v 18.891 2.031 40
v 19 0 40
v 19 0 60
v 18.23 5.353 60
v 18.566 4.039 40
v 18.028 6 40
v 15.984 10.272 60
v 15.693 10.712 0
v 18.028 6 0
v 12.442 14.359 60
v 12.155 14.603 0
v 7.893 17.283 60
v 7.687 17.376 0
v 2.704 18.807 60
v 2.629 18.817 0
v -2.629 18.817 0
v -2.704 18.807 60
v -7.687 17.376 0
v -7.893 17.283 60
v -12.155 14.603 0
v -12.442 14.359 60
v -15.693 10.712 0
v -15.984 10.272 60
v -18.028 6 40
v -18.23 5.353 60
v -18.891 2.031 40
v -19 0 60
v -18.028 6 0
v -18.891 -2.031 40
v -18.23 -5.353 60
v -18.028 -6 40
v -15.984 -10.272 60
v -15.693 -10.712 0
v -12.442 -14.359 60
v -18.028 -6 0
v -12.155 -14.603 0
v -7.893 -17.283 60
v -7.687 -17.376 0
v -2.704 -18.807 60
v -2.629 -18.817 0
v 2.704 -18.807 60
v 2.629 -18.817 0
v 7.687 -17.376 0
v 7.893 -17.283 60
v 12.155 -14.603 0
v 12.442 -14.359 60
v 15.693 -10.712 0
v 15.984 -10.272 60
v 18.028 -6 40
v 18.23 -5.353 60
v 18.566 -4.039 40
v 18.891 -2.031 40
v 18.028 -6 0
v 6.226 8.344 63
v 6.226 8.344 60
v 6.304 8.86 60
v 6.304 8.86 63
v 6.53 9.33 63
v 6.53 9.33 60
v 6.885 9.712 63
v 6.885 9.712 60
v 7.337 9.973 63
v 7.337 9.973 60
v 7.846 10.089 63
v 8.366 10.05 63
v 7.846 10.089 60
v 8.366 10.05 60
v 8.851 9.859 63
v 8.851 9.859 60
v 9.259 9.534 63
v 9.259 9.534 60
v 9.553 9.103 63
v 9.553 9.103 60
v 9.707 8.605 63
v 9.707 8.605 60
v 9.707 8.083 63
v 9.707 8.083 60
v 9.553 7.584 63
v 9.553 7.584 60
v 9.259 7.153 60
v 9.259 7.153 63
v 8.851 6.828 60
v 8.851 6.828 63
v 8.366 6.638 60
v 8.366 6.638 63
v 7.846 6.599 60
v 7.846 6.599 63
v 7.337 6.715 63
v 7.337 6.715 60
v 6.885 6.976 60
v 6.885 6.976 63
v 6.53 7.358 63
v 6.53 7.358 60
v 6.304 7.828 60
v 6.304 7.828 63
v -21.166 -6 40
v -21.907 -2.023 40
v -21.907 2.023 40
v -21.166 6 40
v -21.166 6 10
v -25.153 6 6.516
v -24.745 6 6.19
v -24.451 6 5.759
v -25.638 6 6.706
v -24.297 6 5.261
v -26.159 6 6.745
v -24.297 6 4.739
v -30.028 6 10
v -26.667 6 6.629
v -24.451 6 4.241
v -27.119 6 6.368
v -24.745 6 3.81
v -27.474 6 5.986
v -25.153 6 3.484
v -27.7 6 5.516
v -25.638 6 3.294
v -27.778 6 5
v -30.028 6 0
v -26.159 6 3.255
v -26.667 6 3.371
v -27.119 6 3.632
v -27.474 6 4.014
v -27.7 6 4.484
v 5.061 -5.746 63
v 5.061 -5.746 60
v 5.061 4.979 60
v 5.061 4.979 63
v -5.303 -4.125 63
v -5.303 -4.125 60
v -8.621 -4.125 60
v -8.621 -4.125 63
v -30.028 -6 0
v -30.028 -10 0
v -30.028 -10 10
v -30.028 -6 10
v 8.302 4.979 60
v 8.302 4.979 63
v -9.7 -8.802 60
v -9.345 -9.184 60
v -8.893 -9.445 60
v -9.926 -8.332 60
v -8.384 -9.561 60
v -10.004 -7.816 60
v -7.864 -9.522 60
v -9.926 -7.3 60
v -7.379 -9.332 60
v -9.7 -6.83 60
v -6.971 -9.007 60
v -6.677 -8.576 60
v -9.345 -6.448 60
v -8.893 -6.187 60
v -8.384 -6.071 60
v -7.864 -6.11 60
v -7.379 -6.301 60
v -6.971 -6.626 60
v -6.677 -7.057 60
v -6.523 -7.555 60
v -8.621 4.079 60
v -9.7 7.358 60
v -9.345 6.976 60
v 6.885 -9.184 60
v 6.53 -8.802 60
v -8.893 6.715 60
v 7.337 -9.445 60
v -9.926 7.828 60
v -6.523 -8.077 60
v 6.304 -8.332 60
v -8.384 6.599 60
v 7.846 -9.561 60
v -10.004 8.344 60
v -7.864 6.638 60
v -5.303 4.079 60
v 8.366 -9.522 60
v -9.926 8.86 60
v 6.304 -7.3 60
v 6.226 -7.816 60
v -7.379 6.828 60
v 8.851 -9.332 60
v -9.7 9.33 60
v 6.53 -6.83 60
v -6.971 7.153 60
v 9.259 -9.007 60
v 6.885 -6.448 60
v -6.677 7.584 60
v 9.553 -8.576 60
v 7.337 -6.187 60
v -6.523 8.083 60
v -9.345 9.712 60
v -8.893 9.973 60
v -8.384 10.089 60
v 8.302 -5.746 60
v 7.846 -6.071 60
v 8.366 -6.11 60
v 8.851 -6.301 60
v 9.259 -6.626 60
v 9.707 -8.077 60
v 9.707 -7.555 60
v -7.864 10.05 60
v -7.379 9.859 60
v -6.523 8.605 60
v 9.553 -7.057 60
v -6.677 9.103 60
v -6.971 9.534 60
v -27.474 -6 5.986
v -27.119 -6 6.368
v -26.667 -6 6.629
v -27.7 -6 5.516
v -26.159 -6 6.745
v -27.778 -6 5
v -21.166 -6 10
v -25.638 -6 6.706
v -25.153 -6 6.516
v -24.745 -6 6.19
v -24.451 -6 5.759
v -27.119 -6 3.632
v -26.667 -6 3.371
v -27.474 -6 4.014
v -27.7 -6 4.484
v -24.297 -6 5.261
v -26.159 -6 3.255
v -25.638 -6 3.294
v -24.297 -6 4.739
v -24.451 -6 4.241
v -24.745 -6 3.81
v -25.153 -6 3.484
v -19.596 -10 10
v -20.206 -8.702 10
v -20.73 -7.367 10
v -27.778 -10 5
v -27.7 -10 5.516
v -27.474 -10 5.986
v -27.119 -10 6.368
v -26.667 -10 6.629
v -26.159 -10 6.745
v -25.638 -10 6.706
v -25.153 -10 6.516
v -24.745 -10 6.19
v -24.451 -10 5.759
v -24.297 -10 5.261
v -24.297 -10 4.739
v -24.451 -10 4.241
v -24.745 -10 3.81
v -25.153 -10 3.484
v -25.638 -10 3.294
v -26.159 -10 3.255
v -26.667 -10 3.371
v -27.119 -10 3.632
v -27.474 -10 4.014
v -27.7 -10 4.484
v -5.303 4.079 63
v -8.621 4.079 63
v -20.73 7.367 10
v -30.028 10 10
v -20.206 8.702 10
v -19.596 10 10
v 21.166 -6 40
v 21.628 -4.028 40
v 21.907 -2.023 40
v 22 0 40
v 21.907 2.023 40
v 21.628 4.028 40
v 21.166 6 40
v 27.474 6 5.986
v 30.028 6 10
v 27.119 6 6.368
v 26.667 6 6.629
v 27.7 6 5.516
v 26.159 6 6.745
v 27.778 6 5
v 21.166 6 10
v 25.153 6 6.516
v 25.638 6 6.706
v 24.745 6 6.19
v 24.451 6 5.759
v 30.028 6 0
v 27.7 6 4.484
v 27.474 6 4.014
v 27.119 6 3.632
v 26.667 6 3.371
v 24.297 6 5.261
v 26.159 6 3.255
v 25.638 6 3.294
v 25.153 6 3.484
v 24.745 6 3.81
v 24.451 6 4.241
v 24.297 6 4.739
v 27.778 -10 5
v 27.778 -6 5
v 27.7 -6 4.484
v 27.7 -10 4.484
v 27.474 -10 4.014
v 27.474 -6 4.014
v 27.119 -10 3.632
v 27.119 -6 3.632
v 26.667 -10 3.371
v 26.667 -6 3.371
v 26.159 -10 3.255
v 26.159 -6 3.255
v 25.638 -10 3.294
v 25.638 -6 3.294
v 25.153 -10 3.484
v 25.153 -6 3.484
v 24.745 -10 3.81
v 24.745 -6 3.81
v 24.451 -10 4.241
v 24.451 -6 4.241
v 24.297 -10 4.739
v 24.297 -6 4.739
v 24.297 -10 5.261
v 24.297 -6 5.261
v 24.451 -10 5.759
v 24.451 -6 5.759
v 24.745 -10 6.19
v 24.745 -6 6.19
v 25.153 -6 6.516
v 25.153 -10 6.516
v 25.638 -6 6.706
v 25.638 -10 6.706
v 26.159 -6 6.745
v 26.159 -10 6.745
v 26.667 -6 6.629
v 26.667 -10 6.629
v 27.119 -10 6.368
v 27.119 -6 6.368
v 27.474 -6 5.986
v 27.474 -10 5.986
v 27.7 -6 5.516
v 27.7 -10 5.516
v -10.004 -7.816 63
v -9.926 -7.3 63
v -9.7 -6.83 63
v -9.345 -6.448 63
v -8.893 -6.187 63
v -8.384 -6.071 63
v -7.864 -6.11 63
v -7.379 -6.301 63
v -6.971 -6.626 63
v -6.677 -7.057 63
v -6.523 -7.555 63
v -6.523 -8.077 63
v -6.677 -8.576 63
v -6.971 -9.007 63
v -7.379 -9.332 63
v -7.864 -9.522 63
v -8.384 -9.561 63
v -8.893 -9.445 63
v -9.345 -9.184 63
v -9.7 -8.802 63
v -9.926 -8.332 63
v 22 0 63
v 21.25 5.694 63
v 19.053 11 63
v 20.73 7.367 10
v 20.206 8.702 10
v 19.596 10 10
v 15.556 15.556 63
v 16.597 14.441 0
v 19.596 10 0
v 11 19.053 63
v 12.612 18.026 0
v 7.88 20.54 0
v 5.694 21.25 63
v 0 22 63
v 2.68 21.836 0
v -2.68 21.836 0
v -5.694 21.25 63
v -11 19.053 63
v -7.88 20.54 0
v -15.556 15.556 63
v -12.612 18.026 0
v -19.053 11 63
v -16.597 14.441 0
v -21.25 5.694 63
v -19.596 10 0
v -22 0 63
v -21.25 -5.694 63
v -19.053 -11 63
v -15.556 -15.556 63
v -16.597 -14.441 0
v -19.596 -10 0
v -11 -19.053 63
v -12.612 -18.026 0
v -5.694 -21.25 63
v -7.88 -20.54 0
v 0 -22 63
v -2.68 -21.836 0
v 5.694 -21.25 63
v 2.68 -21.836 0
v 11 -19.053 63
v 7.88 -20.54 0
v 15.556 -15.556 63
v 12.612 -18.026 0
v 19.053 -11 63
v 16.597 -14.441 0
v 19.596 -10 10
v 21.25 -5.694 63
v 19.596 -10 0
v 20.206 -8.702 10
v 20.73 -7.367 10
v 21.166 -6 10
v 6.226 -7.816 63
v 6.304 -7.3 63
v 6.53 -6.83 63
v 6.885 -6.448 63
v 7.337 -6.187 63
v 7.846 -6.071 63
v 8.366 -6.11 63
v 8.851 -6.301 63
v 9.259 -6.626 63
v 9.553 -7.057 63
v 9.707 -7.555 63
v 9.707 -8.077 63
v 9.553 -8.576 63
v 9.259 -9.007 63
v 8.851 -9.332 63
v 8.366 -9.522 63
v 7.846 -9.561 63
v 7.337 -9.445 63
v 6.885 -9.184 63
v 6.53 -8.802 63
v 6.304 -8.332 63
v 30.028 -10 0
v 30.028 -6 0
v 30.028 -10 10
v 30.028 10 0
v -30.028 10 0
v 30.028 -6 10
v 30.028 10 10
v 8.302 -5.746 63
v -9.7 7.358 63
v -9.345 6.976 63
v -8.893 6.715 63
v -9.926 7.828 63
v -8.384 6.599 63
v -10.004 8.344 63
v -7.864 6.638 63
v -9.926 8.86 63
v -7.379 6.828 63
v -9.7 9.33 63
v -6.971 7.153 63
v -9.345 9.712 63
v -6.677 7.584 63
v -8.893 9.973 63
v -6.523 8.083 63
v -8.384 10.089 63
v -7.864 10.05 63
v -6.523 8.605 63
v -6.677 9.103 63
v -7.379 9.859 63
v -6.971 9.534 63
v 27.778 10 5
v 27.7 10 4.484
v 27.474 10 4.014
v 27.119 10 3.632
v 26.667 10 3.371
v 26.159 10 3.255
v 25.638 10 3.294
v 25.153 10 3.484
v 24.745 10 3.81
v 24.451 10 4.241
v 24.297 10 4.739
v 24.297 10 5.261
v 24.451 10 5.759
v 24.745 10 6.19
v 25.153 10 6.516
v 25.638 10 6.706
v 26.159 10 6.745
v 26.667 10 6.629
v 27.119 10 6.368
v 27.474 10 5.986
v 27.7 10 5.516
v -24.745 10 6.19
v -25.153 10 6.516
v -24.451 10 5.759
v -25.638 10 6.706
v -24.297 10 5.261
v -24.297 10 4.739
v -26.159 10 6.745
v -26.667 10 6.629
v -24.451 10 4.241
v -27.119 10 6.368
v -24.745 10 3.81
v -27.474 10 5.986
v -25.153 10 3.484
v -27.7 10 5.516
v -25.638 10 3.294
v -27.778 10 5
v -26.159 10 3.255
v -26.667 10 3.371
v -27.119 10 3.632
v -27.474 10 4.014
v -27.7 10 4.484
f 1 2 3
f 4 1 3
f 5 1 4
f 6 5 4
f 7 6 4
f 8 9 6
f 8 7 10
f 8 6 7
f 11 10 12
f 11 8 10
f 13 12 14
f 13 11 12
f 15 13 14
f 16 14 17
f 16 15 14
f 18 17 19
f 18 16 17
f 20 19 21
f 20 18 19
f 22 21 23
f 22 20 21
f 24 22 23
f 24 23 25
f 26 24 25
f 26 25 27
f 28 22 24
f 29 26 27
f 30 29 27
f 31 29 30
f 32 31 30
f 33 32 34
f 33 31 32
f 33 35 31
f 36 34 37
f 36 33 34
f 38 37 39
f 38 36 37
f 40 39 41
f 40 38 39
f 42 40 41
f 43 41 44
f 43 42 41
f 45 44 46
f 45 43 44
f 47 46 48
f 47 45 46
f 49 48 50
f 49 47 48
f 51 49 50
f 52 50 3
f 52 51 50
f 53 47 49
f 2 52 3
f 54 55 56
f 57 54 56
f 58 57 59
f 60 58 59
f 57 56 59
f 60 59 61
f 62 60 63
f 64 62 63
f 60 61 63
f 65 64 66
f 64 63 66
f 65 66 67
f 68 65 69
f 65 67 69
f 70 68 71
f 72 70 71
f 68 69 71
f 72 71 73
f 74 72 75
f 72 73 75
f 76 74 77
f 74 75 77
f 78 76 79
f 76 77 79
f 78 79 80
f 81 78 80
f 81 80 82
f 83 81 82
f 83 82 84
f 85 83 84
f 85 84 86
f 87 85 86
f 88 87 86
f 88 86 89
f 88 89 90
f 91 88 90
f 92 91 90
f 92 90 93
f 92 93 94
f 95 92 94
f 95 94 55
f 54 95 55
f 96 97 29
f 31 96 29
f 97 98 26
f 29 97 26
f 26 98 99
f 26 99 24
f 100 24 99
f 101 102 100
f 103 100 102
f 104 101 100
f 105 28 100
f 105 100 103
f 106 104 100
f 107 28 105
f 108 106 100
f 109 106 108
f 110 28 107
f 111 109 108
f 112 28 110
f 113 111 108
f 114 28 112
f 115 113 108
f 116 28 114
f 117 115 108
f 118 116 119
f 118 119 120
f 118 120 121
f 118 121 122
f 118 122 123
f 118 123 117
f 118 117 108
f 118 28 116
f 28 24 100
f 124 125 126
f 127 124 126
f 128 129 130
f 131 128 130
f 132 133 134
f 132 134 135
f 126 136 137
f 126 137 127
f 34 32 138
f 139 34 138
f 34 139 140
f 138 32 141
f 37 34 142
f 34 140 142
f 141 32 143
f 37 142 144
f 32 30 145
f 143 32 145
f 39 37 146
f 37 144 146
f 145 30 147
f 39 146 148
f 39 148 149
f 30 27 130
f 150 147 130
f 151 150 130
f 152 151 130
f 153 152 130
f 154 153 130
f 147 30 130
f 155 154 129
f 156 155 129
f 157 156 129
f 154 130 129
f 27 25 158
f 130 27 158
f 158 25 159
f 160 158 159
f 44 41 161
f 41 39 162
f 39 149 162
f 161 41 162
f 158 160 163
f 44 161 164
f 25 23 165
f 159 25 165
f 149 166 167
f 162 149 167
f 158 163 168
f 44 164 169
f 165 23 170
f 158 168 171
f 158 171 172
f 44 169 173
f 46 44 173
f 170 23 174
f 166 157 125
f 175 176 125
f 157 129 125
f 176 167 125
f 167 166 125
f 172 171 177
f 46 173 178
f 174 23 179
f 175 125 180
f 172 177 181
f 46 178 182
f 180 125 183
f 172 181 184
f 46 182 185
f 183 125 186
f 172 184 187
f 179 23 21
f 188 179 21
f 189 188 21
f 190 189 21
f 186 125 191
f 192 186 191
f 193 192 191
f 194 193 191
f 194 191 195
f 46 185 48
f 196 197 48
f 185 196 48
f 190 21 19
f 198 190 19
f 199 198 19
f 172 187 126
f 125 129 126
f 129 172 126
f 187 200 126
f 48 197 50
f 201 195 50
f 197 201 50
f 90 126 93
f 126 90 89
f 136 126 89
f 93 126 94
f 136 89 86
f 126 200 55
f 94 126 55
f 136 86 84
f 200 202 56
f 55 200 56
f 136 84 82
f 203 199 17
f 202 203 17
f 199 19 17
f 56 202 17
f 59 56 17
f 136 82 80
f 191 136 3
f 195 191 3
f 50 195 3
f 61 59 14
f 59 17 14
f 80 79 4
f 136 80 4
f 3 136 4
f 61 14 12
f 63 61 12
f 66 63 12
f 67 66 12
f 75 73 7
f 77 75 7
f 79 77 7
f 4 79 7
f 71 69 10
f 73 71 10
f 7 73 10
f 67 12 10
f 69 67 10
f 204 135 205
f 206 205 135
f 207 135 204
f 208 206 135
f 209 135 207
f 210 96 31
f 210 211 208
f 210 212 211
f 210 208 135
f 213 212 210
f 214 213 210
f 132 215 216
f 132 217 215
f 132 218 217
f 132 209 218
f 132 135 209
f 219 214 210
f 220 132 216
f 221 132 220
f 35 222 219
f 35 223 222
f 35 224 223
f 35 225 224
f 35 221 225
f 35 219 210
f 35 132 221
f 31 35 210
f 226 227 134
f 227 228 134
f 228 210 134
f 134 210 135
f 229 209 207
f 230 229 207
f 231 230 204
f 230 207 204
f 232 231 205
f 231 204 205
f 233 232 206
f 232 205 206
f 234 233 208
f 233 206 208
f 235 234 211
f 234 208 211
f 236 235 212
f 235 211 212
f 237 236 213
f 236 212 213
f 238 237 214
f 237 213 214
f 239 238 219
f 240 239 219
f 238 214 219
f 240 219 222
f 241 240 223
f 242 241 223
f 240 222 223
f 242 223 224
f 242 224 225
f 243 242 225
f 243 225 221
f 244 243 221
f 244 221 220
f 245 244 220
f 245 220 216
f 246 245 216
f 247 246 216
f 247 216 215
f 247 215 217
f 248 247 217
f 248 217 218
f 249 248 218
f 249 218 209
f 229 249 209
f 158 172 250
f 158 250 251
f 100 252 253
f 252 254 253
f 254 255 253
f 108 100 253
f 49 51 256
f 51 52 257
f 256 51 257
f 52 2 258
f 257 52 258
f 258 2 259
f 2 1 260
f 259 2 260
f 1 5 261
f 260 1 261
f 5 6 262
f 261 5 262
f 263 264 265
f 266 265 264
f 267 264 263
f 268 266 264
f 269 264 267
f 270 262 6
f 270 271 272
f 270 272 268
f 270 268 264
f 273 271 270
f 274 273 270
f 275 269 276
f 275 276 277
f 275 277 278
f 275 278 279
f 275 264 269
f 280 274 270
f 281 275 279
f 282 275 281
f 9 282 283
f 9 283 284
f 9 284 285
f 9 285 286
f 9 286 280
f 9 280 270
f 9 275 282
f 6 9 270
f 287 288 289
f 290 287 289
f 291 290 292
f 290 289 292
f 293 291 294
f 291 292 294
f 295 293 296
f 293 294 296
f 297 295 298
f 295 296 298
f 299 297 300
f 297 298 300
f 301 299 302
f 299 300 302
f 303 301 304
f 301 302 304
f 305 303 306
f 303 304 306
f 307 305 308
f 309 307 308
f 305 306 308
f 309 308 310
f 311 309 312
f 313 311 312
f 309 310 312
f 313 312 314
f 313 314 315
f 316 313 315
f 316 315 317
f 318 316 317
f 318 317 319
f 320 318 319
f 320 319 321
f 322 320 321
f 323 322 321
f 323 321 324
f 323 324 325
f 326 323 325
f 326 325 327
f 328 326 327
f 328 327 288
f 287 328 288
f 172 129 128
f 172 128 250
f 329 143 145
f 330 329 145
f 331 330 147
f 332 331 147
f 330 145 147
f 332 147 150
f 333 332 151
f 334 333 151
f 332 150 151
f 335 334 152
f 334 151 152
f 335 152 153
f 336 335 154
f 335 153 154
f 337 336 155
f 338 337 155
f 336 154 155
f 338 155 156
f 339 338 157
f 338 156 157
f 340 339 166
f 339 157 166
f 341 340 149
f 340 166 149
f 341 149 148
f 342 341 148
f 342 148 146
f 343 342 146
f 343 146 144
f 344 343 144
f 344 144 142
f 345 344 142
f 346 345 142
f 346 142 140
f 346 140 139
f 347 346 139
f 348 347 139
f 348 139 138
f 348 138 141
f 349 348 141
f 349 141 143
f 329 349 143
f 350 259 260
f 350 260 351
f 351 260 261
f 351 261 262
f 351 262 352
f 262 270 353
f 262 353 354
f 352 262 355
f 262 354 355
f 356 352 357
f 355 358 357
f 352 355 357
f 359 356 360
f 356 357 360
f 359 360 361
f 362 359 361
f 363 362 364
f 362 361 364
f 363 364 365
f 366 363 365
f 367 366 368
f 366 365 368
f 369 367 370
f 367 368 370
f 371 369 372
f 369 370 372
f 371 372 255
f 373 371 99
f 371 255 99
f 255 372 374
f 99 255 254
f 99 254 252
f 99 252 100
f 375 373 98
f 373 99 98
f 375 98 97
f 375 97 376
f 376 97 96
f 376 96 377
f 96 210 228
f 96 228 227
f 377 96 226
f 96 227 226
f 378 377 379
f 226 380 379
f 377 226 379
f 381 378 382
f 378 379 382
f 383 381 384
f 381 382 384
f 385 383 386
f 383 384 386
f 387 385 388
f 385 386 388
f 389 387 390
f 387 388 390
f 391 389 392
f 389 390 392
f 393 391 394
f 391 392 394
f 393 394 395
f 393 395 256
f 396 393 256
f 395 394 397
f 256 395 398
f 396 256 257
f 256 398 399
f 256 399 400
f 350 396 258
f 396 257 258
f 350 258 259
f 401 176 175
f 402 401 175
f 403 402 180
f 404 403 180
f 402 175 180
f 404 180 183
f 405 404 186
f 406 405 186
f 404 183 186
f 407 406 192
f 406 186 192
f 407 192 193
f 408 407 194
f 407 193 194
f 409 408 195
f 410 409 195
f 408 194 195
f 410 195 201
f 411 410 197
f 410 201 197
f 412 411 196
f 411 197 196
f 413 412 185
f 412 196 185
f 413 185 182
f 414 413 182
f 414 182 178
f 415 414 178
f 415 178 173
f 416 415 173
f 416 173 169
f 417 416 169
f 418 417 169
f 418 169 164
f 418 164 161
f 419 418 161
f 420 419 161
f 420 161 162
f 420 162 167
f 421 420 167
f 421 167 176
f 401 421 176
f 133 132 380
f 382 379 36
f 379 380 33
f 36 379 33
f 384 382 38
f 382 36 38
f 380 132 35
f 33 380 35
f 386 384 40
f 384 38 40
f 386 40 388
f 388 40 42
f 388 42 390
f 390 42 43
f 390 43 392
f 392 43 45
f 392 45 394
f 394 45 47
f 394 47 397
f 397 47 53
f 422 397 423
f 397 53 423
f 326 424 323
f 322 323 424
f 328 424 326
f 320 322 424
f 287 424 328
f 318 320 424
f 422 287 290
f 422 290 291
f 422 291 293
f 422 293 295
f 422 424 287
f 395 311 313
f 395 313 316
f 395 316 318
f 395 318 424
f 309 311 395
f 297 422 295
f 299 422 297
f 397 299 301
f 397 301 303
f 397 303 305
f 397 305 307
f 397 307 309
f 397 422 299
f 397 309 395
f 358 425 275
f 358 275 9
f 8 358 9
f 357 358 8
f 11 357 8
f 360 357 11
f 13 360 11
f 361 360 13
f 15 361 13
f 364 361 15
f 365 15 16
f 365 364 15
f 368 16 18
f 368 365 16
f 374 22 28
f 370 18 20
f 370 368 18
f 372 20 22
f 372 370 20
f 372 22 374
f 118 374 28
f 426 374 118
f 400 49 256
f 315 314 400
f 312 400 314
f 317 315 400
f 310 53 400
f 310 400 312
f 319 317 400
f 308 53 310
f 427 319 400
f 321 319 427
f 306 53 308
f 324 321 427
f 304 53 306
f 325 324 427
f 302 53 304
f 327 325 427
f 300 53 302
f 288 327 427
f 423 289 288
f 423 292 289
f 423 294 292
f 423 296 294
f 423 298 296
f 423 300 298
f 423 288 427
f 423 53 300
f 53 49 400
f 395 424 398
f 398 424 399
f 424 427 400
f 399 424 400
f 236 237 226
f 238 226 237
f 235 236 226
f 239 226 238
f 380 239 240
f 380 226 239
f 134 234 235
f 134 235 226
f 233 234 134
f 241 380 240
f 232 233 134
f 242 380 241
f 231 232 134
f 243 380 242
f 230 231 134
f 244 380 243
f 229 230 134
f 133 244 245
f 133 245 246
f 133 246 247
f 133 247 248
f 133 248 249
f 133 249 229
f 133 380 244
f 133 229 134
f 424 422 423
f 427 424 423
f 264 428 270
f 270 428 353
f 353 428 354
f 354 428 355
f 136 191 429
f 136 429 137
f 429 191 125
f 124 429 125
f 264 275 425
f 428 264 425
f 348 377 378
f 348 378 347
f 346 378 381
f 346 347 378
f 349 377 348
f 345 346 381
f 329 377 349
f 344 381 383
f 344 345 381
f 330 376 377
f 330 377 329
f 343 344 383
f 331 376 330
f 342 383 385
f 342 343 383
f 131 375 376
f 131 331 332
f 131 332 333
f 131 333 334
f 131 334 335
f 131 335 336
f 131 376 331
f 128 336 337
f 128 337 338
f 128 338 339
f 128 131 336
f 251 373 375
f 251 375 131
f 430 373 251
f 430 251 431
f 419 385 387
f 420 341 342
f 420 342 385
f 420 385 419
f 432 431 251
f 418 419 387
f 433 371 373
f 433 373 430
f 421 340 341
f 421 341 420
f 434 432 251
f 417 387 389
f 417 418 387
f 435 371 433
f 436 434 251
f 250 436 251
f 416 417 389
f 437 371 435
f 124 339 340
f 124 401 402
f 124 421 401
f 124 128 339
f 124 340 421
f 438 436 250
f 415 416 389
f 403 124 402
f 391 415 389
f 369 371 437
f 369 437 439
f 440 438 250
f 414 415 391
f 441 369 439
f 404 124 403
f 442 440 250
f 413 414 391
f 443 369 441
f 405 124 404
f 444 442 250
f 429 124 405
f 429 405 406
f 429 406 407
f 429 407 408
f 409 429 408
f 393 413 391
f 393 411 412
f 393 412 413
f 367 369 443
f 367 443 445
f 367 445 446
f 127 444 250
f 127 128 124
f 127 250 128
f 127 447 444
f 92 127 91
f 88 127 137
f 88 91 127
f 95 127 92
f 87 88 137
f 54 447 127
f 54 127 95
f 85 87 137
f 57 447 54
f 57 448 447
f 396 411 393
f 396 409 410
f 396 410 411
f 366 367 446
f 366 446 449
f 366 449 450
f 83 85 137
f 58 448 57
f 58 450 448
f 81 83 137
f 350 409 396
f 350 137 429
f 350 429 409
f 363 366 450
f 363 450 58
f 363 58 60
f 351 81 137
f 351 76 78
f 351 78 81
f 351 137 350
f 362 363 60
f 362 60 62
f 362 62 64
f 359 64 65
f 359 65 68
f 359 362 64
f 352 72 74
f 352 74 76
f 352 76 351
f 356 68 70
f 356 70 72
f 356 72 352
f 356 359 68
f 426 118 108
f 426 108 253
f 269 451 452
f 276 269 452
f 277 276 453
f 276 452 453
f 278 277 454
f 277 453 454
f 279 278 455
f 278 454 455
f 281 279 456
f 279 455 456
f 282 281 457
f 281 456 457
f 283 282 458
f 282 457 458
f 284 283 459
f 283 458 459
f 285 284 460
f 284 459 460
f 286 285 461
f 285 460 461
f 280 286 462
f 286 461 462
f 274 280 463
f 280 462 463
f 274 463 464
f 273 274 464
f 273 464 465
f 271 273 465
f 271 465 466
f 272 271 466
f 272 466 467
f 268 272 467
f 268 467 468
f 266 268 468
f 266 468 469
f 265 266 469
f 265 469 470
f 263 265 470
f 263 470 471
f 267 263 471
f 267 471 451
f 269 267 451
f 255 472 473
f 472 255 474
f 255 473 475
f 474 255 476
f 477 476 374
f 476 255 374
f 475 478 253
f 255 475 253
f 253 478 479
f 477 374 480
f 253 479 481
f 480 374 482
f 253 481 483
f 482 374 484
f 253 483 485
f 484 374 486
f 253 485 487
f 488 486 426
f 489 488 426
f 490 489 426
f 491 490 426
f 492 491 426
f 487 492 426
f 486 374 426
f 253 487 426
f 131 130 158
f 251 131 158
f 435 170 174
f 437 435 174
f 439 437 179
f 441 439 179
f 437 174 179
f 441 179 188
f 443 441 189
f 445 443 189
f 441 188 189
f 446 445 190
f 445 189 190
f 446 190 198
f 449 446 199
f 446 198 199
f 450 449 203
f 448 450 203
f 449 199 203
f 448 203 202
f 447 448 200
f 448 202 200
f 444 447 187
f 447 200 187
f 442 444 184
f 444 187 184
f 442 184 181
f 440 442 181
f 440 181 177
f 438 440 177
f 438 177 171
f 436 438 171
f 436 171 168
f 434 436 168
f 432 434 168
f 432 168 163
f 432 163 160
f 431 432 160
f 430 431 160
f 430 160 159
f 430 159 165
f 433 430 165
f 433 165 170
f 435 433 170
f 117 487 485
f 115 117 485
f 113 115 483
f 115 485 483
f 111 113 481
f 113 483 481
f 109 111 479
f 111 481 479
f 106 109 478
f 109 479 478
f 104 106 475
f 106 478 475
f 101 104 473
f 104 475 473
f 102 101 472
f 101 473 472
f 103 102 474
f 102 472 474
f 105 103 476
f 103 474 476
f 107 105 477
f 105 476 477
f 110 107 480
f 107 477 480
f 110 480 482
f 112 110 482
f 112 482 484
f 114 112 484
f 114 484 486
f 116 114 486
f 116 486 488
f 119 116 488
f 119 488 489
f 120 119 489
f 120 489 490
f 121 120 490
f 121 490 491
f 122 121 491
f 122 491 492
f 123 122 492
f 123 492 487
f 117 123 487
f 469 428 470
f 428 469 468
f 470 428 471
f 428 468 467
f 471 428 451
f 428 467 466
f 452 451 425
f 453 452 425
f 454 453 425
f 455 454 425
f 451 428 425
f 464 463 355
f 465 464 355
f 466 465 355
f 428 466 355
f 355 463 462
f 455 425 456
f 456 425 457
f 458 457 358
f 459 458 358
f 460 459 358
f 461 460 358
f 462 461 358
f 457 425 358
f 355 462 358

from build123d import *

# Parameters (mm, degrees)
SKETCH1_R           = 22
SKETCH1_R_2         = 19
BOSS_EXTRUDE1_DEPTH = 60
SKETCH2_R           = 22
BOSS_EXTRUDE2_DEPTH = 3
CUT_EXTRUDE1_DEPTH  = 40
SKETCH8_R           = 1.75
SKETCH8_W           = 3.317773355
SKETCH8_H           = 8.204416282
SKETCH8_W_2         = 3.240615835
SKETCH8_H_2         = 10.724895265
CUT_EXTRUDE4_DEPTH  = 68.586980995
SKETCH9_W           = 12
SKETCH9_H           = 4
BOSS_EXTRUDE3_DEPTH = 10
SKETCH10_R          = 1.75
CUT_EXTRUDE5_DEPTH  = 77.776729242


with BuildPart() as part:
    # Sketch1 → Boss-Extrude1 (new body)
    with BuildSketch(Plane.XY):
        Circle(SKETCH1_R)
        Circle(SKETCH1_R_2, mode=Mode.SUBTRACT)
    extrude(amount=BOSS_EXTRUDE1_DEPTH)

    # Sketch2 → Boss-Extrude2 (add)
    with BuildSketch(Plane.XY.offset(60)):
        Circle(SKETCH2_R)
    extrude(amount=BOSS_EXTRUDE2_DEPTH)

    # Sketch3 → Cut-Extrude1 (cut)
    with BuildSketch(Plane(origin=(0, 0, 0), x_dir=(-1, 0, 0), z_dir=(0, 0, -1))):
        with BuildLine():
            Line((-21.166010489, 6), (-18.027756377, 6))
            ThreePointArc((-18.027756377, 6), (-19, 0), (-18.027756377, -6))
            Line((-18.027756377, -6), (-21.166010489, -6))
            ThreePointArc((-21.166010489, -6), (-22, 0), (-21.166010489, 6))
        make_face()
        with BuildLine():
            Line((18.027756377, 6), (21.166010489, 6))
            ThreePointArc((21.166010489, 6), (22, 0), (21.166010489, -6))
            Line((21.166010489, -6), (18.027756377, -6))
            ThreePointArc((18.027756377, -6), (19, 0), (18.027756377, 6))
        make_face()
    extrude(amount=-CUT_EXTRUDE1_DEPTH, mode=Mode.SUBTRACT)

    # Sketch8 → Cut-Extrude4 (cut, through all)
    with BuildSketch(Plane(origin=(0, 0, 60), x_dir=(-1, 0, 0), z_dir=(0, 0, -1))):
        with Locations((-7.976328212, -7.816252109)):
            Circle(SKETCH8_R)
        with Locations((-7.976328212, 8.343747891)):
            Circle(SKETCH8_R)
        with Locations((8.253671788, 8.343747891)):
            Circle(SKETCH8_R)
        with Locations((8.253671788, -7.816252109)):
            Circle(SKETCH8_R)
        with Locations((6.962249116, -0.023129474)):
            Rectangle(SKETCH8_W, SKETCH8_H)
        with Locations((-6.681772319, -0.3831979)):
            Rectangle(SKETCH8_W_2, SKETCH8_H_2)
    extrude(amount=-CUT_EXTRUDE4_DEPTH, mode=Mode.SUBTRACT)

    # Sketch9 → Boss-Extrude3 (add)
    with BuildSketch(Plane(origin=(0, 0, 0), x_dir=(-1, 0, 0), z_dir=(0, 0, -1))):
        with Locations((-24.027756377, 8)):
            Rectangle(SKETCH9_W, SKETCH9_H)
        with Locations((-24.027756377, -8)):
            Rectangle(SKETCH9_W, SKETCH9_H)
        with Locations((24.027756377, -8)):
            Rectangle(SKETCH9_W, SKETCH9_H)
        with Locations((24.027756377, 8)):
            Rectangle(SKETCH9_W, SKETCH9_H)
    extrude(amount=-BOSS_EXTRUDE3_DEPTH)

    # Sketch10 → Cut-Extrude5 (cut, through all)
    with BuildSketch(Plane(origin=(0, 10, 0), x_dir=(1, 0, 0), z_dir=(0, 1, 0))):
        with Locations(Location((-26.027756377, -5, 0), (0, 0, 180))):
            Circle(SKETCH10_R)
        with Locations((26.027756377, -5)):
            Circle(SKETCH10_R)
    extrude(amount=-CUT_EXTRUDE5_DEPTH, mode=Mode.SUBTRACT)


solid = part.part
